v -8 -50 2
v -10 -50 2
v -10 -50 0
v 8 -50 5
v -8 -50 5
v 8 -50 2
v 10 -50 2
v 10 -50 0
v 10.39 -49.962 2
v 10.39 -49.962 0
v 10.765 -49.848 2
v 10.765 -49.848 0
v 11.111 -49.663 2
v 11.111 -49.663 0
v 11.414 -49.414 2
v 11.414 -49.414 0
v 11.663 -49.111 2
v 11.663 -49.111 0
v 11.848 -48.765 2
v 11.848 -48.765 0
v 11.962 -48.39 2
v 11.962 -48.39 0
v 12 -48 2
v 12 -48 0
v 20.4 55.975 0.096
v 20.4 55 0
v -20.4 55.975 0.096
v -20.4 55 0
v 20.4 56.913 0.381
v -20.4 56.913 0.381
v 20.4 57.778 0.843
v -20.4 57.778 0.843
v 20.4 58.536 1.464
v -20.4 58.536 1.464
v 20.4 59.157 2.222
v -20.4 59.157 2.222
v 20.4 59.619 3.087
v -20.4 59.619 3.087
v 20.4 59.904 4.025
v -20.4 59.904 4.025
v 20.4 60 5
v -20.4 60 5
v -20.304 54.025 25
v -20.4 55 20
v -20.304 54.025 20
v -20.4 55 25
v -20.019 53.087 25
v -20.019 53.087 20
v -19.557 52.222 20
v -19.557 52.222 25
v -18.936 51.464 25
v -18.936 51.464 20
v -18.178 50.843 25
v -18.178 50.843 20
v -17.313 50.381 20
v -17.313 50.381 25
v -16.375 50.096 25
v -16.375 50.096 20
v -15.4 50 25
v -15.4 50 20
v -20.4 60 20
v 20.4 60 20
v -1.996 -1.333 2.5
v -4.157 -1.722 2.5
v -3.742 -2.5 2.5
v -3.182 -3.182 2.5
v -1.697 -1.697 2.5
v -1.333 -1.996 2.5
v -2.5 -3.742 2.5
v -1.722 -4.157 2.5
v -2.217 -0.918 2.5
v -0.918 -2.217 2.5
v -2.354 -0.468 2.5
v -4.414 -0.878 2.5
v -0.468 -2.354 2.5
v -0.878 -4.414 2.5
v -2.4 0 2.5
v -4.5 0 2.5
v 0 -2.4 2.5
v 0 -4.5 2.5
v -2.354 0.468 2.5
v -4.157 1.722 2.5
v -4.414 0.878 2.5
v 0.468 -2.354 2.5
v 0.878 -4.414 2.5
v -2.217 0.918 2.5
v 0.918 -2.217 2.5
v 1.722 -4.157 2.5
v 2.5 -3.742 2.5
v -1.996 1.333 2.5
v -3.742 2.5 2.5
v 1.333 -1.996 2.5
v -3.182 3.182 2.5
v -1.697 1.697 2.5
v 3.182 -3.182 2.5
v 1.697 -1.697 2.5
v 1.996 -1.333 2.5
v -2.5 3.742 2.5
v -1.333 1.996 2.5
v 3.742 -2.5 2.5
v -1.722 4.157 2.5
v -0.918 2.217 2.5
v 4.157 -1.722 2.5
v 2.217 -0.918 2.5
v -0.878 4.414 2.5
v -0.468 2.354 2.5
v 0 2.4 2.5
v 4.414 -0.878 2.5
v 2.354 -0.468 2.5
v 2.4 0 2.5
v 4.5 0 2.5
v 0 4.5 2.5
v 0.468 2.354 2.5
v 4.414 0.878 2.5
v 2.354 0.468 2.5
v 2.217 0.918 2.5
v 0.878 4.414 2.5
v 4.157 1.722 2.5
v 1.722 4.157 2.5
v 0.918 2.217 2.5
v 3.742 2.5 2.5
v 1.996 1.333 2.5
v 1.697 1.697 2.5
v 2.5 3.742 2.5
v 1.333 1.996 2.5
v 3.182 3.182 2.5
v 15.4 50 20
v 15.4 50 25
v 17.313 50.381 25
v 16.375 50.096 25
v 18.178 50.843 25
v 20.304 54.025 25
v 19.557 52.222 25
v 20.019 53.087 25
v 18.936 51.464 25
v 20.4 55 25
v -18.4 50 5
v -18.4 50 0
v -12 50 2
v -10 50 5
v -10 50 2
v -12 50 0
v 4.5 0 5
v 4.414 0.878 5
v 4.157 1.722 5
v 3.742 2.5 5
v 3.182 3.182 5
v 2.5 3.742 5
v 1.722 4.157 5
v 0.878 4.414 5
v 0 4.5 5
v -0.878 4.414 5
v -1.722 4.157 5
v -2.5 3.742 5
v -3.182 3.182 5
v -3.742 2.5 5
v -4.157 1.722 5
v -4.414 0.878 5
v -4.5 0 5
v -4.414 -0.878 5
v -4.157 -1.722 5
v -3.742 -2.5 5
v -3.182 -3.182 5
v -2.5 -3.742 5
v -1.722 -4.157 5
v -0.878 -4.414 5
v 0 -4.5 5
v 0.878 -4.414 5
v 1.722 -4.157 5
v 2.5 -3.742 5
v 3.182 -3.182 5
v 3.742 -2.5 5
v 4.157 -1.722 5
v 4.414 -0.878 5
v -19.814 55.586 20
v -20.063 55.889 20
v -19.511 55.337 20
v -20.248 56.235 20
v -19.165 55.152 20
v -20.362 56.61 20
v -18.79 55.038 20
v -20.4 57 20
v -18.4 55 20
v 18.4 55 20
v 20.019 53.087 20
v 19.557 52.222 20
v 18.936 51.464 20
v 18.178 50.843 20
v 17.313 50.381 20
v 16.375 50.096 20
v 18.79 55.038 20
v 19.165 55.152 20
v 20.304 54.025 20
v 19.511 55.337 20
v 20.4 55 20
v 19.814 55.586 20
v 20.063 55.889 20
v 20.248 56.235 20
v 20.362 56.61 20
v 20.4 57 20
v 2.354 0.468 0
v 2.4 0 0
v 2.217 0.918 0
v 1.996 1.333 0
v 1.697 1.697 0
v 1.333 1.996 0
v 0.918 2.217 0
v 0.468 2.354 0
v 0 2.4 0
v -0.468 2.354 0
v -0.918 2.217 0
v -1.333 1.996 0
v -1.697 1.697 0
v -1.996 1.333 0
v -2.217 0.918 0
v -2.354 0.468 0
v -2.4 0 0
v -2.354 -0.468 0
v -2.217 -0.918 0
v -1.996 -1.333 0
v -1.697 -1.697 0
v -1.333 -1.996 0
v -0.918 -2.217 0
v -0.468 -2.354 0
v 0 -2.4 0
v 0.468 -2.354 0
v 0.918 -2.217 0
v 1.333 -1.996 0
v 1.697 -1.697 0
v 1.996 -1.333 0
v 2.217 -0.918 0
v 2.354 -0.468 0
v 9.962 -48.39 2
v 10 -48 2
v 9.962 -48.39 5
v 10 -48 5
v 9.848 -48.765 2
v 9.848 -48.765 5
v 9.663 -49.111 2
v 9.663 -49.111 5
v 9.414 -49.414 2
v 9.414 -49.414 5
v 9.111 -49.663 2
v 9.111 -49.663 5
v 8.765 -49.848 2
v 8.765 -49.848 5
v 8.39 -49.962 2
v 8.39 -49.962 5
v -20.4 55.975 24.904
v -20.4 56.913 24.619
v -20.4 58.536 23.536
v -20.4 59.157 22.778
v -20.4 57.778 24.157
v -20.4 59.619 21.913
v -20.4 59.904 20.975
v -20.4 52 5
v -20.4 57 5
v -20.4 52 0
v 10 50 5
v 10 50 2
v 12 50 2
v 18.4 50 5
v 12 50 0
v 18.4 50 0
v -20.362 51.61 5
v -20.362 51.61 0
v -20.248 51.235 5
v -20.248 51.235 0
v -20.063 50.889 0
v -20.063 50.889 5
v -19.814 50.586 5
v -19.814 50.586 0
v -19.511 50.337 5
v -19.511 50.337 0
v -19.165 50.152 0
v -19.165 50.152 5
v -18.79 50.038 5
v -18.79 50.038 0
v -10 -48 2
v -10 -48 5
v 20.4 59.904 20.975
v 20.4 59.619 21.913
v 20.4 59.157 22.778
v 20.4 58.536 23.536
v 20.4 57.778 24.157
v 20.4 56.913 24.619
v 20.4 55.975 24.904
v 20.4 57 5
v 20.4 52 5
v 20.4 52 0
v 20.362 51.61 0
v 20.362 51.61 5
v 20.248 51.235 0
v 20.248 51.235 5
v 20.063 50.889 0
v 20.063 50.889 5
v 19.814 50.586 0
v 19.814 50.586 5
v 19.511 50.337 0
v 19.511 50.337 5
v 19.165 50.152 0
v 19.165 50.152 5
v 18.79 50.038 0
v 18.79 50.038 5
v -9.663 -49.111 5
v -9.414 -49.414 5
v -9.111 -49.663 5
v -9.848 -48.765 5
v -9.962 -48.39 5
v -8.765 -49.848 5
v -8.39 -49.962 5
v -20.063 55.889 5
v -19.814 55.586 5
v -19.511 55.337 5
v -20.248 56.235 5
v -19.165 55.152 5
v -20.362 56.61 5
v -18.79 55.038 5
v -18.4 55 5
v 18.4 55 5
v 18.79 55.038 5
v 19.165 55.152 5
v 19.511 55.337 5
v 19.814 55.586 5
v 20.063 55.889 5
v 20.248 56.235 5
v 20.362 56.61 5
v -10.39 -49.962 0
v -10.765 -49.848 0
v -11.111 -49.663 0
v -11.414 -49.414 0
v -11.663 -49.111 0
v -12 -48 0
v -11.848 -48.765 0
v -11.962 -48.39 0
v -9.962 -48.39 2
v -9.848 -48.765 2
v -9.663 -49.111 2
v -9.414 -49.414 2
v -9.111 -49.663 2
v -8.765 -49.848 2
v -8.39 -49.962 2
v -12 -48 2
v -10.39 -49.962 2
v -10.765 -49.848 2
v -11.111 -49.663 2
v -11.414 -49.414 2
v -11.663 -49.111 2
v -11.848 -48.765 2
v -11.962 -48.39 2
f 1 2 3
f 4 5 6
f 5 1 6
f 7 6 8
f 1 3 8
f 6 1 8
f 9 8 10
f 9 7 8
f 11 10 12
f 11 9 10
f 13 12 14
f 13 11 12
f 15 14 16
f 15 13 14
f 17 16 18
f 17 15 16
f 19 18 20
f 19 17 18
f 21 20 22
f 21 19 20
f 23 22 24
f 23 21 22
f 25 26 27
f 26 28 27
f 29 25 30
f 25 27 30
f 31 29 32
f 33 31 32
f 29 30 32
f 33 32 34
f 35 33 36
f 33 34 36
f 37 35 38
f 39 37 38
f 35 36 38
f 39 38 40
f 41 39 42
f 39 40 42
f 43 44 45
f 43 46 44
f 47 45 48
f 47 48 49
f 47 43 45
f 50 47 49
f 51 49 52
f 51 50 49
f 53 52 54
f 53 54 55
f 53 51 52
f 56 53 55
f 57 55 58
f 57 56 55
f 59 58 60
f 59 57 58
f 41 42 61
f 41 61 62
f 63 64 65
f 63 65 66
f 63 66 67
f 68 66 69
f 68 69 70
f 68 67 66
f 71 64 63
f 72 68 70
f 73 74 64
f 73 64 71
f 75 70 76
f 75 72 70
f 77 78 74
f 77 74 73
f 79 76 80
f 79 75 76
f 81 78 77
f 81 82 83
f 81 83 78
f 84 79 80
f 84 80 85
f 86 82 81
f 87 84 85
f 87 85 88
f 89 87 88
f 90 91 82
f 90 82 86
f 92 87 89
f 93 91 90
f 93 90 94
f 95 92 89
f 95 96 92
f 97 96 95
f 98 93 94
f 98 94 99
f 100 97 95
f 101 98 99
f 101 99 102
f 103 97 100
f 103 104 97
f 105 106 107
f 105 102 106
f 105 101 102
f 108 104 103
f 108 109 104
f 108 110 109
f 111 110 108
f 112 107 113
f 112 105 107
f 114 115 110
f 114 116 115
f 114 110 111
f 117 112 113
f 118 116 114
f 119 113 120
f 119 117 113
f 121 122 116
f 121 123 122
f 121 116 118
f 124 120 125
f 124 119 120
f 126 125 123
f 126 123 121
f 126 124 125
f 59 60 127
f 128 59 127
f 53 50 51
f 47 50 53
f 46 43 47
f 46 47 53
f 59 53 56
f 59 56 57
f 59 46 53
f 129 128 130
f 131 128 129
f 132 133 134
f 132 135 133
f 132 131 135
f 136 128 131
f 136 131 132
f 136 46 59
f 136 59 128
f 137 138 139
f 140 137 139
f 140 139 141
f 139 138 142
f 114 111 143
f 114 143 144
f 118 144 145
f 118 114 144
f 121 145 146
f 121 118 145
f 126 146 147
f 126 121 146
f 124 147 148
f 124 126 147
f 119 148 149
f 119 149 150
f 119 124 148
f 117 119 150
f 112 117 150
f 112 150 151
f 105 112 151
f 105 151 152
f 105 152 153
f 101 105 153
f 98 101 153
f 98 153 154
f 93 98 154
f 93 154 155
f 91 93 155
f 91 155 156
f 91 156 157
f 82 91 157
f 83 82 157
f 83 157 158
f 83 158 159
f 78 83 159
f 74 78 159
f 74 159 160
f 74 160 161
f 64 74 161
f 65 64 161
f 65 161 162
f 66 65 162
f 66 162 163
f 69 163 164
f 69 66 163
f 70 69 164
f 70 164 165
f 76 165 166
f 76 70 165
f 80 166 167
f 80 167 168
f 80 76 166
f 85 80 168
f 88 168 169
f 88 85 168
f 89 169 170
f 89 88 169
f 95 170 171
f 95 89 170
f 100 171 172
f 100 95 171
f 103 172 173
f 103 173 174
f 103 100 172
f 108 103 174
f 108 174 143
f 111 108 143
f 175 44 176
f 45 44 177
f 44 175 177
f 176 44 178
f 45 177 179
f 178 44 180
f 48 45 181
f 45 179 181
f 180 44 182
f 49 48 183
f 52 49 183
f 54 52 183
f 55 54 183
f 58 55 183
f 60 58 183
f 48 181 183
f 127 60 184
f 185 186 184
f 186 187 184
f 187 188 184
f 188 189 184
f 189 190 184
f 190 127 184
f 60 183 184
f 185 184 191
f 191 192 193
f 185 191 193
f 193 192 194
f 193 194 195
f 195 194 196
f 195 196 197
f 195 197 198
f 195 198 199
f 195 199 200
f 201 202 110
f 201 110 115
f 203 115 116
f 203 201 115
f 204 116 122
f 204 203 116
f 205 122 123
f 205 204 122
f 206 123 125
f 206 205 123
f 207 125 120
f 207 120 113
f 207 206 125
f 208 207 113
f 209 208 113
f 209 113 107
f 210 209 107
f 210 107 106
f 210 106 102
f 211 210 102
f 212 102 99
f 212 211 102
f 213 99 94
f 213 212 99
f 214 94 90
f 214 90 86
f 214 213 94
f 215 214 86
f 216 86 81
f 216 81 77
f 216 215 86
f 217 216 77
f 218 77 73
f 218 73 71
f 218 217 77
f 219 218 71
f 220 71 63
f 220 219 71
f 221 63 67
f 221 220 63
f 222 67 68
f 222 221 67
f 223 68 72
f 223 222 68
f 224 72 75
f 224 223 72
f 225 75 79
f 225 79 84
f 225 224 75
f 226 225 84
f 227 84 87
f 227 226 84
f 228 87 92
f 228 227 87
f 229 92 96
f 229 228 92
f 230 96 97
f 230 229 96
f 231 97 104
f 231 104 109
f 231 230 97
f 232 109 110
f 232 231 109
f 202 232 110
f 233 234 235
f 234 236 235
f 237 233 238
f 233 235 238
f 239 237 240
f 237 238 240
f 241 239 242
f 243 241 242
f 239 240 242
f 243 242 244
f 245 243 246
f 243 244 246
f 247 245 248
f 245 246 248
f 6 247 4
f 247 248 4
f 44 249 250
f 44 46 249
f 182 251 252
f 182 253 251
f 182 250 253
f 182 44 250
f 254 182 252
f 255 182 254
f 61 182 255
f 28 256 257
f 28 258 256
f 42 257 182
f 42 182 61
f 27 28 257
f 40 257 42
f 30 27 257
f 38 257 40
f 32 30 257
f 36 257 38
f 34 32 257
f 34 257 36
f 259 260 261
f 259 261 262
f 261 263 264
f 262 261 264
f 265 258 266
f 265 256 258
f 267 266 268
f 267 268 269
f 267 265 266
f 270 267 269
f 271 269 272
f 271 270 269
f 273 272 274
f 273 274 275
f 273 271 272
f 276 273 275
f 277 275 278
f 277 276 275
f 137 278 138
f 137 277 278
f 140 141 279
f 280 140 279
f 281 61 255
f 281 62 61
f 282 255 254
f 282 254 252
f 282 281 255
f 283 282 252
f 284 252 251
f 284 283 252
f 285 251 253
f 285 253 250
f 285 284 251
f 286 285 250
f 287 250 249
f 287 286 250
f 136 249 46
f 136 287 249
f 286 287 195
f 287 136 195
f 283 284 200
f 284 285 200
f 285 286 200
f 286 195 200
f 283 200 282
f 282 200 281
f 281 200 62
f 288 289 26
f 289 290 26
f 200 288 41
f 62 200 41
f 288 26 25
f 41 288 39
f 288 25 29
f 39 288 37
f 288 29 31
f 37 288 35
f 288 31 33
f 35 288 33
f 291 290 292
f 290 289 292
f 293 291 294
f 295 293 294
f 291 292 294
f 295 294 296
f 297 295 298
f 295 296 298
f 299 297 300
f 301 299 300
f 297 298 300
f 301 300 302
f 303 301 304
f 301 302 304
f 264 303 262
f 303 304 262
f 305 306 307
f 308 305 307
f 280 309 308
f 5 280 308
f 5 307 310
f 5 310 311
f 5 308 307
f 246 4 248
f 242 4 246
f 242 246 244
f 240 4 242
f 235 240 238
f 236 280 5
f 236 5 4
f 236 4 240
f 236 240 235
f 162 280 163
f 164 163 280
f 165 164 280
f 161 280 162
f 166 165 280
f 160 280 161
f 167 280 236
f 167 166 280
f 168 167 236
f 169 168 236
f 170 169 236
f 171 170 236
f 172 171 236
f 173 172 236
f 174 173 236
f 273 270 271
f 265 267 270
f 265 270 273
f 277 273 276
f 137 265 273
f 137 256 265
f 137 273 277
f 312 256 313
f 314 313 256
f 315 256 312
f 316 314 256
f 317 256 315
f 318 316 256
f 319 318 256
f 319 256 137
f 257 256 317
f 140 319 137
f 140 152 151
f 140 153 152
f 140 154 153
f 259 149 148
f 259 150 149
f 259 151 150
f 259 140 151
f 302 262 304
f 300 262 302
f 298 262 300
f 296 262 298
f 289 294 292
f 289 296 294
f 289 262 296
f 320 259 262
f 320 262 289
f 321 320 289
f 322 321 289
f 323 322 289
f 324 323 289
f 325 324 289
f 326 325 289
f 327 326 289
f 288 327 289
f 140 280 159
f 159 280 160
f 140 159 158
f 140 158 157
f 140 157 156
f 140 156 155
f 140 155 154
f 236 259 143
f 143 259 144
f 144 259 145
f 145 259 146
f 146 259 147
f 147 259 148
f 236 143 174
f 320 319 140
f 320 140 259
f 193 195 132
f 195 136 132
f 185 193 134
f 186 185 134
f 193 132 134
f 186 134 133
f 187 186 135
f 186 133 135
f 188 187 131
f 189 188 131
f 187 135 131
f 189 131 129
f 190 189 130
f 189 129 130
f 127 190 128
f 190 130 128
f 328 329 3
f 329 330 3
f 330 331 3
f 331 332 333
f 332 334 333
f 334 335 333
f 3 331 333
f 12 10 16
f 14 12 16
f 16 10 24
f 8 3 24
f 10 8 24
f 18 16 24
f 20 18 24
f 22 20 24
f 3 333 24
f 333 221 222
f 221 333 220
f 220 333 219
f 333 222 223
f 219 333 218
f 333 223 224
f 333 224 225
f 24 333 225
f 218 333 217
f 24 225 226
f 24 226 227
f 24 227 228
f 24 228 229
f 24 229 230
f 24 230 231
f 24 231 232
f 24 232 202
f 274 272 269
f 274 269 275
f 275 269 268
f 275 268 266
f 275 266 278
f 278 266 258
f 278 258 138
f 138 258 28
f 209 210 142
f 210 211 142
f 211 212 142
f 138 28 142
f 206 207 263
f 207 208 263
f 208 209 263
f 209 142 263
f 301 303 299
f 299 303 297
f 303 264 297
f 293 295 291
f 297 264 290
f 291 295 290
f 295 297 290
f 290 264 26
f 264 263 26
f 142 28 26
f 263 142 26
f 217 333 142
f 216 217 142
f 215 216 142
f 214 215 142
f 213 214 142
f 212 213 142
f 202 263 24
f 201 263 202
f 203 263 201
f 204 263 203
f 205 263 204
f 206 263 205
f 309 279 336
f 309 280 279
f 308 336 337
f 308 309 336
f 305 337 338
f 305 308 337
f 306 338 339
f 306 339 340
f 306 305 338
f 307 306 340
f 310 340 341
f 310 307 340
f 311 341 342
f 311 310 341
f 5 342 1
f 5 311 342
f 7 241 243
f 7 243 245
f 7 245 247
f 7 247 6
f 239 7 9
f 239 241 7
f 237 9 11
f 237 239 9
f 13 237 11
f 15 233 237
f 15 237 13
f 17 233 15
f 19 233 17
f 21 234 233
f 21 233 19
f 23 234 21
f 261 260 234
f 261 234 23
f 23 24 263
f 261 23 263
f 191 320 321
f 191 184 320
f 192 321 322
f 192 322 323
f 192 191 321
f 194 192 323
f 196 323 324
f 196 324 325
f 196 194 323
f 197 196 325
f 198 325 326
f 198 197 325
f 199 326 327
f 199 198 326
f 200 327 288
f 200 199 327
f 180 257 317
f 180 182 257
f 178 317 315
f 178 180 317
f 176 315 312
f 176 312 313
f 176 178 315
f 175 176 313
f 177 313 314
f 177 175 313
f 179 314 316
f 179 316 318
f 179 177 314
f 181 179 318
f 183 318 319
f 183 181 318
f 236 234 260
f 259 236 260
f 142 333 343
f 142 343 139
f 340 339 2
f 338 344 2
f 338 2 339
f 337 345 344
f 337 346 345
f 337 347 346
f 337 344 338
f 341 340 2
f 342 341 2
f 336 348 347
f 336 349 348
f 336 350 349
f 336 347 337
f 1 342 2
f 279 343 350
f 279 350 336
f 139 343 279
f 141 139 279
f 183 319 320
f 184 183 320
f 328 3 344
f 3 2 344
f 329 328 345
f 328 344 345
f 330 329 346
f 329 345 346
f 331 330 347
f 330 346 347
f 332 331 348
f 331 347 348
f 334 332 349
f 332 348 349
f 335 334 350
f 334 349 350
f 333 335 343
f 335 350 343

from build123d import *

# Parameters (mm, degrees)
F0_R     = 4.5
F0_R_2   = 2.4
F1_DEPTH = 2.5
F2_DEPTH = 5
F0_W     = 2
F0_H     = 100
F3_DEPTH = 2
F4_W     = 40.8
F4_H     = 5
F5_DEPTH = 15
F6_W     = 40.8
F6_H     = 10
F7_DEPTH = 5
F8_R     = 4.99999
F9_R     = 2


# Not quite as in the source:
# - a fillet or chamfer is up to 0.001 mm smaller than in the source, because OpenCascade refuses the exact size


with BuildPart() as f1:
    # F0 (on Top) → F1 (new body)
    with BuildSketch(Plane.XY):
        Circle(F0_R)
        Circle(F0_R_2, mode=Mode.SUBTRACT)
    extrude(amount=F1_DEPTH)

    # F0 (on Top) → F2 (join)
    with BuildSketch(Plane.XY):
        Polygon((-10, -50), (10, -50), (10, 50), (0, 50), (-10, 50), align=None)
        Circle(F0_R, mode=Mode.SUBTRACT)
        Polygon((0, 50), (10, 50), (12, 50), (20.4, 50), (20.4, 60), (-20.4, 60), (-20.4, 50), (-12, 50), (-10, 50), align=None)
    extrude(amount=F2_DEPTH)

    # F0 (on Top) → F3 (join)
    with BuildSketch(Plane.XY):
        with Locations((-11, 0)):
            Rectangle(F0_W, F0_H)
        with Locations((11, 0)):
            Rectangle(F0_W, F0_H)
    extrude(amount=F3_DEPTH)

    # F4 (on face) → F5 (join)
    with BuildSketch(Plane.XY.offset(5)):
        with Locations((0, 57.5)):
            Rectangle(F4_W, F4_H)
    extrude(amount=F5_DEPTH)

    # F6 (on face) → F7 (join)
    with BuildSketch(Plane.XY.offset(20)):
        with Locations((0, 55)):
            Rectangle(F6_W, F6_H)
    extrude(amount=F7_DEPTH)

    # F8 (radius 5 in the source; OpenCascade refuses exactly that, so slightly less here)
    f8_edges = [f1.edges().sort_by_distance(p)[0] for p in [
        (-20.4, 50, 22.5),
        (20.4, 50, 22.5),
        (0, 60, 25),
        (0, 60, 0),
    ]]
    fillet(f8_edges, radius=F8_R)

    # F9
    f9_edges = [f1.edges().sort_by_distance(p)[0] for p in [
        (-20.4, 55, 12.5),
        (20.4, 55, 12.5),
        (-12, -50, 1),
        (12, -50, 1),
        (-10, -50, 3.5),
        (10, -50, 3.5),
        (-20.4, 50, 2.5),
        (20.4, 50, 2.5),
    ]]
    fillet(f9_edges, radius=F9_R)


solid = f1.part
